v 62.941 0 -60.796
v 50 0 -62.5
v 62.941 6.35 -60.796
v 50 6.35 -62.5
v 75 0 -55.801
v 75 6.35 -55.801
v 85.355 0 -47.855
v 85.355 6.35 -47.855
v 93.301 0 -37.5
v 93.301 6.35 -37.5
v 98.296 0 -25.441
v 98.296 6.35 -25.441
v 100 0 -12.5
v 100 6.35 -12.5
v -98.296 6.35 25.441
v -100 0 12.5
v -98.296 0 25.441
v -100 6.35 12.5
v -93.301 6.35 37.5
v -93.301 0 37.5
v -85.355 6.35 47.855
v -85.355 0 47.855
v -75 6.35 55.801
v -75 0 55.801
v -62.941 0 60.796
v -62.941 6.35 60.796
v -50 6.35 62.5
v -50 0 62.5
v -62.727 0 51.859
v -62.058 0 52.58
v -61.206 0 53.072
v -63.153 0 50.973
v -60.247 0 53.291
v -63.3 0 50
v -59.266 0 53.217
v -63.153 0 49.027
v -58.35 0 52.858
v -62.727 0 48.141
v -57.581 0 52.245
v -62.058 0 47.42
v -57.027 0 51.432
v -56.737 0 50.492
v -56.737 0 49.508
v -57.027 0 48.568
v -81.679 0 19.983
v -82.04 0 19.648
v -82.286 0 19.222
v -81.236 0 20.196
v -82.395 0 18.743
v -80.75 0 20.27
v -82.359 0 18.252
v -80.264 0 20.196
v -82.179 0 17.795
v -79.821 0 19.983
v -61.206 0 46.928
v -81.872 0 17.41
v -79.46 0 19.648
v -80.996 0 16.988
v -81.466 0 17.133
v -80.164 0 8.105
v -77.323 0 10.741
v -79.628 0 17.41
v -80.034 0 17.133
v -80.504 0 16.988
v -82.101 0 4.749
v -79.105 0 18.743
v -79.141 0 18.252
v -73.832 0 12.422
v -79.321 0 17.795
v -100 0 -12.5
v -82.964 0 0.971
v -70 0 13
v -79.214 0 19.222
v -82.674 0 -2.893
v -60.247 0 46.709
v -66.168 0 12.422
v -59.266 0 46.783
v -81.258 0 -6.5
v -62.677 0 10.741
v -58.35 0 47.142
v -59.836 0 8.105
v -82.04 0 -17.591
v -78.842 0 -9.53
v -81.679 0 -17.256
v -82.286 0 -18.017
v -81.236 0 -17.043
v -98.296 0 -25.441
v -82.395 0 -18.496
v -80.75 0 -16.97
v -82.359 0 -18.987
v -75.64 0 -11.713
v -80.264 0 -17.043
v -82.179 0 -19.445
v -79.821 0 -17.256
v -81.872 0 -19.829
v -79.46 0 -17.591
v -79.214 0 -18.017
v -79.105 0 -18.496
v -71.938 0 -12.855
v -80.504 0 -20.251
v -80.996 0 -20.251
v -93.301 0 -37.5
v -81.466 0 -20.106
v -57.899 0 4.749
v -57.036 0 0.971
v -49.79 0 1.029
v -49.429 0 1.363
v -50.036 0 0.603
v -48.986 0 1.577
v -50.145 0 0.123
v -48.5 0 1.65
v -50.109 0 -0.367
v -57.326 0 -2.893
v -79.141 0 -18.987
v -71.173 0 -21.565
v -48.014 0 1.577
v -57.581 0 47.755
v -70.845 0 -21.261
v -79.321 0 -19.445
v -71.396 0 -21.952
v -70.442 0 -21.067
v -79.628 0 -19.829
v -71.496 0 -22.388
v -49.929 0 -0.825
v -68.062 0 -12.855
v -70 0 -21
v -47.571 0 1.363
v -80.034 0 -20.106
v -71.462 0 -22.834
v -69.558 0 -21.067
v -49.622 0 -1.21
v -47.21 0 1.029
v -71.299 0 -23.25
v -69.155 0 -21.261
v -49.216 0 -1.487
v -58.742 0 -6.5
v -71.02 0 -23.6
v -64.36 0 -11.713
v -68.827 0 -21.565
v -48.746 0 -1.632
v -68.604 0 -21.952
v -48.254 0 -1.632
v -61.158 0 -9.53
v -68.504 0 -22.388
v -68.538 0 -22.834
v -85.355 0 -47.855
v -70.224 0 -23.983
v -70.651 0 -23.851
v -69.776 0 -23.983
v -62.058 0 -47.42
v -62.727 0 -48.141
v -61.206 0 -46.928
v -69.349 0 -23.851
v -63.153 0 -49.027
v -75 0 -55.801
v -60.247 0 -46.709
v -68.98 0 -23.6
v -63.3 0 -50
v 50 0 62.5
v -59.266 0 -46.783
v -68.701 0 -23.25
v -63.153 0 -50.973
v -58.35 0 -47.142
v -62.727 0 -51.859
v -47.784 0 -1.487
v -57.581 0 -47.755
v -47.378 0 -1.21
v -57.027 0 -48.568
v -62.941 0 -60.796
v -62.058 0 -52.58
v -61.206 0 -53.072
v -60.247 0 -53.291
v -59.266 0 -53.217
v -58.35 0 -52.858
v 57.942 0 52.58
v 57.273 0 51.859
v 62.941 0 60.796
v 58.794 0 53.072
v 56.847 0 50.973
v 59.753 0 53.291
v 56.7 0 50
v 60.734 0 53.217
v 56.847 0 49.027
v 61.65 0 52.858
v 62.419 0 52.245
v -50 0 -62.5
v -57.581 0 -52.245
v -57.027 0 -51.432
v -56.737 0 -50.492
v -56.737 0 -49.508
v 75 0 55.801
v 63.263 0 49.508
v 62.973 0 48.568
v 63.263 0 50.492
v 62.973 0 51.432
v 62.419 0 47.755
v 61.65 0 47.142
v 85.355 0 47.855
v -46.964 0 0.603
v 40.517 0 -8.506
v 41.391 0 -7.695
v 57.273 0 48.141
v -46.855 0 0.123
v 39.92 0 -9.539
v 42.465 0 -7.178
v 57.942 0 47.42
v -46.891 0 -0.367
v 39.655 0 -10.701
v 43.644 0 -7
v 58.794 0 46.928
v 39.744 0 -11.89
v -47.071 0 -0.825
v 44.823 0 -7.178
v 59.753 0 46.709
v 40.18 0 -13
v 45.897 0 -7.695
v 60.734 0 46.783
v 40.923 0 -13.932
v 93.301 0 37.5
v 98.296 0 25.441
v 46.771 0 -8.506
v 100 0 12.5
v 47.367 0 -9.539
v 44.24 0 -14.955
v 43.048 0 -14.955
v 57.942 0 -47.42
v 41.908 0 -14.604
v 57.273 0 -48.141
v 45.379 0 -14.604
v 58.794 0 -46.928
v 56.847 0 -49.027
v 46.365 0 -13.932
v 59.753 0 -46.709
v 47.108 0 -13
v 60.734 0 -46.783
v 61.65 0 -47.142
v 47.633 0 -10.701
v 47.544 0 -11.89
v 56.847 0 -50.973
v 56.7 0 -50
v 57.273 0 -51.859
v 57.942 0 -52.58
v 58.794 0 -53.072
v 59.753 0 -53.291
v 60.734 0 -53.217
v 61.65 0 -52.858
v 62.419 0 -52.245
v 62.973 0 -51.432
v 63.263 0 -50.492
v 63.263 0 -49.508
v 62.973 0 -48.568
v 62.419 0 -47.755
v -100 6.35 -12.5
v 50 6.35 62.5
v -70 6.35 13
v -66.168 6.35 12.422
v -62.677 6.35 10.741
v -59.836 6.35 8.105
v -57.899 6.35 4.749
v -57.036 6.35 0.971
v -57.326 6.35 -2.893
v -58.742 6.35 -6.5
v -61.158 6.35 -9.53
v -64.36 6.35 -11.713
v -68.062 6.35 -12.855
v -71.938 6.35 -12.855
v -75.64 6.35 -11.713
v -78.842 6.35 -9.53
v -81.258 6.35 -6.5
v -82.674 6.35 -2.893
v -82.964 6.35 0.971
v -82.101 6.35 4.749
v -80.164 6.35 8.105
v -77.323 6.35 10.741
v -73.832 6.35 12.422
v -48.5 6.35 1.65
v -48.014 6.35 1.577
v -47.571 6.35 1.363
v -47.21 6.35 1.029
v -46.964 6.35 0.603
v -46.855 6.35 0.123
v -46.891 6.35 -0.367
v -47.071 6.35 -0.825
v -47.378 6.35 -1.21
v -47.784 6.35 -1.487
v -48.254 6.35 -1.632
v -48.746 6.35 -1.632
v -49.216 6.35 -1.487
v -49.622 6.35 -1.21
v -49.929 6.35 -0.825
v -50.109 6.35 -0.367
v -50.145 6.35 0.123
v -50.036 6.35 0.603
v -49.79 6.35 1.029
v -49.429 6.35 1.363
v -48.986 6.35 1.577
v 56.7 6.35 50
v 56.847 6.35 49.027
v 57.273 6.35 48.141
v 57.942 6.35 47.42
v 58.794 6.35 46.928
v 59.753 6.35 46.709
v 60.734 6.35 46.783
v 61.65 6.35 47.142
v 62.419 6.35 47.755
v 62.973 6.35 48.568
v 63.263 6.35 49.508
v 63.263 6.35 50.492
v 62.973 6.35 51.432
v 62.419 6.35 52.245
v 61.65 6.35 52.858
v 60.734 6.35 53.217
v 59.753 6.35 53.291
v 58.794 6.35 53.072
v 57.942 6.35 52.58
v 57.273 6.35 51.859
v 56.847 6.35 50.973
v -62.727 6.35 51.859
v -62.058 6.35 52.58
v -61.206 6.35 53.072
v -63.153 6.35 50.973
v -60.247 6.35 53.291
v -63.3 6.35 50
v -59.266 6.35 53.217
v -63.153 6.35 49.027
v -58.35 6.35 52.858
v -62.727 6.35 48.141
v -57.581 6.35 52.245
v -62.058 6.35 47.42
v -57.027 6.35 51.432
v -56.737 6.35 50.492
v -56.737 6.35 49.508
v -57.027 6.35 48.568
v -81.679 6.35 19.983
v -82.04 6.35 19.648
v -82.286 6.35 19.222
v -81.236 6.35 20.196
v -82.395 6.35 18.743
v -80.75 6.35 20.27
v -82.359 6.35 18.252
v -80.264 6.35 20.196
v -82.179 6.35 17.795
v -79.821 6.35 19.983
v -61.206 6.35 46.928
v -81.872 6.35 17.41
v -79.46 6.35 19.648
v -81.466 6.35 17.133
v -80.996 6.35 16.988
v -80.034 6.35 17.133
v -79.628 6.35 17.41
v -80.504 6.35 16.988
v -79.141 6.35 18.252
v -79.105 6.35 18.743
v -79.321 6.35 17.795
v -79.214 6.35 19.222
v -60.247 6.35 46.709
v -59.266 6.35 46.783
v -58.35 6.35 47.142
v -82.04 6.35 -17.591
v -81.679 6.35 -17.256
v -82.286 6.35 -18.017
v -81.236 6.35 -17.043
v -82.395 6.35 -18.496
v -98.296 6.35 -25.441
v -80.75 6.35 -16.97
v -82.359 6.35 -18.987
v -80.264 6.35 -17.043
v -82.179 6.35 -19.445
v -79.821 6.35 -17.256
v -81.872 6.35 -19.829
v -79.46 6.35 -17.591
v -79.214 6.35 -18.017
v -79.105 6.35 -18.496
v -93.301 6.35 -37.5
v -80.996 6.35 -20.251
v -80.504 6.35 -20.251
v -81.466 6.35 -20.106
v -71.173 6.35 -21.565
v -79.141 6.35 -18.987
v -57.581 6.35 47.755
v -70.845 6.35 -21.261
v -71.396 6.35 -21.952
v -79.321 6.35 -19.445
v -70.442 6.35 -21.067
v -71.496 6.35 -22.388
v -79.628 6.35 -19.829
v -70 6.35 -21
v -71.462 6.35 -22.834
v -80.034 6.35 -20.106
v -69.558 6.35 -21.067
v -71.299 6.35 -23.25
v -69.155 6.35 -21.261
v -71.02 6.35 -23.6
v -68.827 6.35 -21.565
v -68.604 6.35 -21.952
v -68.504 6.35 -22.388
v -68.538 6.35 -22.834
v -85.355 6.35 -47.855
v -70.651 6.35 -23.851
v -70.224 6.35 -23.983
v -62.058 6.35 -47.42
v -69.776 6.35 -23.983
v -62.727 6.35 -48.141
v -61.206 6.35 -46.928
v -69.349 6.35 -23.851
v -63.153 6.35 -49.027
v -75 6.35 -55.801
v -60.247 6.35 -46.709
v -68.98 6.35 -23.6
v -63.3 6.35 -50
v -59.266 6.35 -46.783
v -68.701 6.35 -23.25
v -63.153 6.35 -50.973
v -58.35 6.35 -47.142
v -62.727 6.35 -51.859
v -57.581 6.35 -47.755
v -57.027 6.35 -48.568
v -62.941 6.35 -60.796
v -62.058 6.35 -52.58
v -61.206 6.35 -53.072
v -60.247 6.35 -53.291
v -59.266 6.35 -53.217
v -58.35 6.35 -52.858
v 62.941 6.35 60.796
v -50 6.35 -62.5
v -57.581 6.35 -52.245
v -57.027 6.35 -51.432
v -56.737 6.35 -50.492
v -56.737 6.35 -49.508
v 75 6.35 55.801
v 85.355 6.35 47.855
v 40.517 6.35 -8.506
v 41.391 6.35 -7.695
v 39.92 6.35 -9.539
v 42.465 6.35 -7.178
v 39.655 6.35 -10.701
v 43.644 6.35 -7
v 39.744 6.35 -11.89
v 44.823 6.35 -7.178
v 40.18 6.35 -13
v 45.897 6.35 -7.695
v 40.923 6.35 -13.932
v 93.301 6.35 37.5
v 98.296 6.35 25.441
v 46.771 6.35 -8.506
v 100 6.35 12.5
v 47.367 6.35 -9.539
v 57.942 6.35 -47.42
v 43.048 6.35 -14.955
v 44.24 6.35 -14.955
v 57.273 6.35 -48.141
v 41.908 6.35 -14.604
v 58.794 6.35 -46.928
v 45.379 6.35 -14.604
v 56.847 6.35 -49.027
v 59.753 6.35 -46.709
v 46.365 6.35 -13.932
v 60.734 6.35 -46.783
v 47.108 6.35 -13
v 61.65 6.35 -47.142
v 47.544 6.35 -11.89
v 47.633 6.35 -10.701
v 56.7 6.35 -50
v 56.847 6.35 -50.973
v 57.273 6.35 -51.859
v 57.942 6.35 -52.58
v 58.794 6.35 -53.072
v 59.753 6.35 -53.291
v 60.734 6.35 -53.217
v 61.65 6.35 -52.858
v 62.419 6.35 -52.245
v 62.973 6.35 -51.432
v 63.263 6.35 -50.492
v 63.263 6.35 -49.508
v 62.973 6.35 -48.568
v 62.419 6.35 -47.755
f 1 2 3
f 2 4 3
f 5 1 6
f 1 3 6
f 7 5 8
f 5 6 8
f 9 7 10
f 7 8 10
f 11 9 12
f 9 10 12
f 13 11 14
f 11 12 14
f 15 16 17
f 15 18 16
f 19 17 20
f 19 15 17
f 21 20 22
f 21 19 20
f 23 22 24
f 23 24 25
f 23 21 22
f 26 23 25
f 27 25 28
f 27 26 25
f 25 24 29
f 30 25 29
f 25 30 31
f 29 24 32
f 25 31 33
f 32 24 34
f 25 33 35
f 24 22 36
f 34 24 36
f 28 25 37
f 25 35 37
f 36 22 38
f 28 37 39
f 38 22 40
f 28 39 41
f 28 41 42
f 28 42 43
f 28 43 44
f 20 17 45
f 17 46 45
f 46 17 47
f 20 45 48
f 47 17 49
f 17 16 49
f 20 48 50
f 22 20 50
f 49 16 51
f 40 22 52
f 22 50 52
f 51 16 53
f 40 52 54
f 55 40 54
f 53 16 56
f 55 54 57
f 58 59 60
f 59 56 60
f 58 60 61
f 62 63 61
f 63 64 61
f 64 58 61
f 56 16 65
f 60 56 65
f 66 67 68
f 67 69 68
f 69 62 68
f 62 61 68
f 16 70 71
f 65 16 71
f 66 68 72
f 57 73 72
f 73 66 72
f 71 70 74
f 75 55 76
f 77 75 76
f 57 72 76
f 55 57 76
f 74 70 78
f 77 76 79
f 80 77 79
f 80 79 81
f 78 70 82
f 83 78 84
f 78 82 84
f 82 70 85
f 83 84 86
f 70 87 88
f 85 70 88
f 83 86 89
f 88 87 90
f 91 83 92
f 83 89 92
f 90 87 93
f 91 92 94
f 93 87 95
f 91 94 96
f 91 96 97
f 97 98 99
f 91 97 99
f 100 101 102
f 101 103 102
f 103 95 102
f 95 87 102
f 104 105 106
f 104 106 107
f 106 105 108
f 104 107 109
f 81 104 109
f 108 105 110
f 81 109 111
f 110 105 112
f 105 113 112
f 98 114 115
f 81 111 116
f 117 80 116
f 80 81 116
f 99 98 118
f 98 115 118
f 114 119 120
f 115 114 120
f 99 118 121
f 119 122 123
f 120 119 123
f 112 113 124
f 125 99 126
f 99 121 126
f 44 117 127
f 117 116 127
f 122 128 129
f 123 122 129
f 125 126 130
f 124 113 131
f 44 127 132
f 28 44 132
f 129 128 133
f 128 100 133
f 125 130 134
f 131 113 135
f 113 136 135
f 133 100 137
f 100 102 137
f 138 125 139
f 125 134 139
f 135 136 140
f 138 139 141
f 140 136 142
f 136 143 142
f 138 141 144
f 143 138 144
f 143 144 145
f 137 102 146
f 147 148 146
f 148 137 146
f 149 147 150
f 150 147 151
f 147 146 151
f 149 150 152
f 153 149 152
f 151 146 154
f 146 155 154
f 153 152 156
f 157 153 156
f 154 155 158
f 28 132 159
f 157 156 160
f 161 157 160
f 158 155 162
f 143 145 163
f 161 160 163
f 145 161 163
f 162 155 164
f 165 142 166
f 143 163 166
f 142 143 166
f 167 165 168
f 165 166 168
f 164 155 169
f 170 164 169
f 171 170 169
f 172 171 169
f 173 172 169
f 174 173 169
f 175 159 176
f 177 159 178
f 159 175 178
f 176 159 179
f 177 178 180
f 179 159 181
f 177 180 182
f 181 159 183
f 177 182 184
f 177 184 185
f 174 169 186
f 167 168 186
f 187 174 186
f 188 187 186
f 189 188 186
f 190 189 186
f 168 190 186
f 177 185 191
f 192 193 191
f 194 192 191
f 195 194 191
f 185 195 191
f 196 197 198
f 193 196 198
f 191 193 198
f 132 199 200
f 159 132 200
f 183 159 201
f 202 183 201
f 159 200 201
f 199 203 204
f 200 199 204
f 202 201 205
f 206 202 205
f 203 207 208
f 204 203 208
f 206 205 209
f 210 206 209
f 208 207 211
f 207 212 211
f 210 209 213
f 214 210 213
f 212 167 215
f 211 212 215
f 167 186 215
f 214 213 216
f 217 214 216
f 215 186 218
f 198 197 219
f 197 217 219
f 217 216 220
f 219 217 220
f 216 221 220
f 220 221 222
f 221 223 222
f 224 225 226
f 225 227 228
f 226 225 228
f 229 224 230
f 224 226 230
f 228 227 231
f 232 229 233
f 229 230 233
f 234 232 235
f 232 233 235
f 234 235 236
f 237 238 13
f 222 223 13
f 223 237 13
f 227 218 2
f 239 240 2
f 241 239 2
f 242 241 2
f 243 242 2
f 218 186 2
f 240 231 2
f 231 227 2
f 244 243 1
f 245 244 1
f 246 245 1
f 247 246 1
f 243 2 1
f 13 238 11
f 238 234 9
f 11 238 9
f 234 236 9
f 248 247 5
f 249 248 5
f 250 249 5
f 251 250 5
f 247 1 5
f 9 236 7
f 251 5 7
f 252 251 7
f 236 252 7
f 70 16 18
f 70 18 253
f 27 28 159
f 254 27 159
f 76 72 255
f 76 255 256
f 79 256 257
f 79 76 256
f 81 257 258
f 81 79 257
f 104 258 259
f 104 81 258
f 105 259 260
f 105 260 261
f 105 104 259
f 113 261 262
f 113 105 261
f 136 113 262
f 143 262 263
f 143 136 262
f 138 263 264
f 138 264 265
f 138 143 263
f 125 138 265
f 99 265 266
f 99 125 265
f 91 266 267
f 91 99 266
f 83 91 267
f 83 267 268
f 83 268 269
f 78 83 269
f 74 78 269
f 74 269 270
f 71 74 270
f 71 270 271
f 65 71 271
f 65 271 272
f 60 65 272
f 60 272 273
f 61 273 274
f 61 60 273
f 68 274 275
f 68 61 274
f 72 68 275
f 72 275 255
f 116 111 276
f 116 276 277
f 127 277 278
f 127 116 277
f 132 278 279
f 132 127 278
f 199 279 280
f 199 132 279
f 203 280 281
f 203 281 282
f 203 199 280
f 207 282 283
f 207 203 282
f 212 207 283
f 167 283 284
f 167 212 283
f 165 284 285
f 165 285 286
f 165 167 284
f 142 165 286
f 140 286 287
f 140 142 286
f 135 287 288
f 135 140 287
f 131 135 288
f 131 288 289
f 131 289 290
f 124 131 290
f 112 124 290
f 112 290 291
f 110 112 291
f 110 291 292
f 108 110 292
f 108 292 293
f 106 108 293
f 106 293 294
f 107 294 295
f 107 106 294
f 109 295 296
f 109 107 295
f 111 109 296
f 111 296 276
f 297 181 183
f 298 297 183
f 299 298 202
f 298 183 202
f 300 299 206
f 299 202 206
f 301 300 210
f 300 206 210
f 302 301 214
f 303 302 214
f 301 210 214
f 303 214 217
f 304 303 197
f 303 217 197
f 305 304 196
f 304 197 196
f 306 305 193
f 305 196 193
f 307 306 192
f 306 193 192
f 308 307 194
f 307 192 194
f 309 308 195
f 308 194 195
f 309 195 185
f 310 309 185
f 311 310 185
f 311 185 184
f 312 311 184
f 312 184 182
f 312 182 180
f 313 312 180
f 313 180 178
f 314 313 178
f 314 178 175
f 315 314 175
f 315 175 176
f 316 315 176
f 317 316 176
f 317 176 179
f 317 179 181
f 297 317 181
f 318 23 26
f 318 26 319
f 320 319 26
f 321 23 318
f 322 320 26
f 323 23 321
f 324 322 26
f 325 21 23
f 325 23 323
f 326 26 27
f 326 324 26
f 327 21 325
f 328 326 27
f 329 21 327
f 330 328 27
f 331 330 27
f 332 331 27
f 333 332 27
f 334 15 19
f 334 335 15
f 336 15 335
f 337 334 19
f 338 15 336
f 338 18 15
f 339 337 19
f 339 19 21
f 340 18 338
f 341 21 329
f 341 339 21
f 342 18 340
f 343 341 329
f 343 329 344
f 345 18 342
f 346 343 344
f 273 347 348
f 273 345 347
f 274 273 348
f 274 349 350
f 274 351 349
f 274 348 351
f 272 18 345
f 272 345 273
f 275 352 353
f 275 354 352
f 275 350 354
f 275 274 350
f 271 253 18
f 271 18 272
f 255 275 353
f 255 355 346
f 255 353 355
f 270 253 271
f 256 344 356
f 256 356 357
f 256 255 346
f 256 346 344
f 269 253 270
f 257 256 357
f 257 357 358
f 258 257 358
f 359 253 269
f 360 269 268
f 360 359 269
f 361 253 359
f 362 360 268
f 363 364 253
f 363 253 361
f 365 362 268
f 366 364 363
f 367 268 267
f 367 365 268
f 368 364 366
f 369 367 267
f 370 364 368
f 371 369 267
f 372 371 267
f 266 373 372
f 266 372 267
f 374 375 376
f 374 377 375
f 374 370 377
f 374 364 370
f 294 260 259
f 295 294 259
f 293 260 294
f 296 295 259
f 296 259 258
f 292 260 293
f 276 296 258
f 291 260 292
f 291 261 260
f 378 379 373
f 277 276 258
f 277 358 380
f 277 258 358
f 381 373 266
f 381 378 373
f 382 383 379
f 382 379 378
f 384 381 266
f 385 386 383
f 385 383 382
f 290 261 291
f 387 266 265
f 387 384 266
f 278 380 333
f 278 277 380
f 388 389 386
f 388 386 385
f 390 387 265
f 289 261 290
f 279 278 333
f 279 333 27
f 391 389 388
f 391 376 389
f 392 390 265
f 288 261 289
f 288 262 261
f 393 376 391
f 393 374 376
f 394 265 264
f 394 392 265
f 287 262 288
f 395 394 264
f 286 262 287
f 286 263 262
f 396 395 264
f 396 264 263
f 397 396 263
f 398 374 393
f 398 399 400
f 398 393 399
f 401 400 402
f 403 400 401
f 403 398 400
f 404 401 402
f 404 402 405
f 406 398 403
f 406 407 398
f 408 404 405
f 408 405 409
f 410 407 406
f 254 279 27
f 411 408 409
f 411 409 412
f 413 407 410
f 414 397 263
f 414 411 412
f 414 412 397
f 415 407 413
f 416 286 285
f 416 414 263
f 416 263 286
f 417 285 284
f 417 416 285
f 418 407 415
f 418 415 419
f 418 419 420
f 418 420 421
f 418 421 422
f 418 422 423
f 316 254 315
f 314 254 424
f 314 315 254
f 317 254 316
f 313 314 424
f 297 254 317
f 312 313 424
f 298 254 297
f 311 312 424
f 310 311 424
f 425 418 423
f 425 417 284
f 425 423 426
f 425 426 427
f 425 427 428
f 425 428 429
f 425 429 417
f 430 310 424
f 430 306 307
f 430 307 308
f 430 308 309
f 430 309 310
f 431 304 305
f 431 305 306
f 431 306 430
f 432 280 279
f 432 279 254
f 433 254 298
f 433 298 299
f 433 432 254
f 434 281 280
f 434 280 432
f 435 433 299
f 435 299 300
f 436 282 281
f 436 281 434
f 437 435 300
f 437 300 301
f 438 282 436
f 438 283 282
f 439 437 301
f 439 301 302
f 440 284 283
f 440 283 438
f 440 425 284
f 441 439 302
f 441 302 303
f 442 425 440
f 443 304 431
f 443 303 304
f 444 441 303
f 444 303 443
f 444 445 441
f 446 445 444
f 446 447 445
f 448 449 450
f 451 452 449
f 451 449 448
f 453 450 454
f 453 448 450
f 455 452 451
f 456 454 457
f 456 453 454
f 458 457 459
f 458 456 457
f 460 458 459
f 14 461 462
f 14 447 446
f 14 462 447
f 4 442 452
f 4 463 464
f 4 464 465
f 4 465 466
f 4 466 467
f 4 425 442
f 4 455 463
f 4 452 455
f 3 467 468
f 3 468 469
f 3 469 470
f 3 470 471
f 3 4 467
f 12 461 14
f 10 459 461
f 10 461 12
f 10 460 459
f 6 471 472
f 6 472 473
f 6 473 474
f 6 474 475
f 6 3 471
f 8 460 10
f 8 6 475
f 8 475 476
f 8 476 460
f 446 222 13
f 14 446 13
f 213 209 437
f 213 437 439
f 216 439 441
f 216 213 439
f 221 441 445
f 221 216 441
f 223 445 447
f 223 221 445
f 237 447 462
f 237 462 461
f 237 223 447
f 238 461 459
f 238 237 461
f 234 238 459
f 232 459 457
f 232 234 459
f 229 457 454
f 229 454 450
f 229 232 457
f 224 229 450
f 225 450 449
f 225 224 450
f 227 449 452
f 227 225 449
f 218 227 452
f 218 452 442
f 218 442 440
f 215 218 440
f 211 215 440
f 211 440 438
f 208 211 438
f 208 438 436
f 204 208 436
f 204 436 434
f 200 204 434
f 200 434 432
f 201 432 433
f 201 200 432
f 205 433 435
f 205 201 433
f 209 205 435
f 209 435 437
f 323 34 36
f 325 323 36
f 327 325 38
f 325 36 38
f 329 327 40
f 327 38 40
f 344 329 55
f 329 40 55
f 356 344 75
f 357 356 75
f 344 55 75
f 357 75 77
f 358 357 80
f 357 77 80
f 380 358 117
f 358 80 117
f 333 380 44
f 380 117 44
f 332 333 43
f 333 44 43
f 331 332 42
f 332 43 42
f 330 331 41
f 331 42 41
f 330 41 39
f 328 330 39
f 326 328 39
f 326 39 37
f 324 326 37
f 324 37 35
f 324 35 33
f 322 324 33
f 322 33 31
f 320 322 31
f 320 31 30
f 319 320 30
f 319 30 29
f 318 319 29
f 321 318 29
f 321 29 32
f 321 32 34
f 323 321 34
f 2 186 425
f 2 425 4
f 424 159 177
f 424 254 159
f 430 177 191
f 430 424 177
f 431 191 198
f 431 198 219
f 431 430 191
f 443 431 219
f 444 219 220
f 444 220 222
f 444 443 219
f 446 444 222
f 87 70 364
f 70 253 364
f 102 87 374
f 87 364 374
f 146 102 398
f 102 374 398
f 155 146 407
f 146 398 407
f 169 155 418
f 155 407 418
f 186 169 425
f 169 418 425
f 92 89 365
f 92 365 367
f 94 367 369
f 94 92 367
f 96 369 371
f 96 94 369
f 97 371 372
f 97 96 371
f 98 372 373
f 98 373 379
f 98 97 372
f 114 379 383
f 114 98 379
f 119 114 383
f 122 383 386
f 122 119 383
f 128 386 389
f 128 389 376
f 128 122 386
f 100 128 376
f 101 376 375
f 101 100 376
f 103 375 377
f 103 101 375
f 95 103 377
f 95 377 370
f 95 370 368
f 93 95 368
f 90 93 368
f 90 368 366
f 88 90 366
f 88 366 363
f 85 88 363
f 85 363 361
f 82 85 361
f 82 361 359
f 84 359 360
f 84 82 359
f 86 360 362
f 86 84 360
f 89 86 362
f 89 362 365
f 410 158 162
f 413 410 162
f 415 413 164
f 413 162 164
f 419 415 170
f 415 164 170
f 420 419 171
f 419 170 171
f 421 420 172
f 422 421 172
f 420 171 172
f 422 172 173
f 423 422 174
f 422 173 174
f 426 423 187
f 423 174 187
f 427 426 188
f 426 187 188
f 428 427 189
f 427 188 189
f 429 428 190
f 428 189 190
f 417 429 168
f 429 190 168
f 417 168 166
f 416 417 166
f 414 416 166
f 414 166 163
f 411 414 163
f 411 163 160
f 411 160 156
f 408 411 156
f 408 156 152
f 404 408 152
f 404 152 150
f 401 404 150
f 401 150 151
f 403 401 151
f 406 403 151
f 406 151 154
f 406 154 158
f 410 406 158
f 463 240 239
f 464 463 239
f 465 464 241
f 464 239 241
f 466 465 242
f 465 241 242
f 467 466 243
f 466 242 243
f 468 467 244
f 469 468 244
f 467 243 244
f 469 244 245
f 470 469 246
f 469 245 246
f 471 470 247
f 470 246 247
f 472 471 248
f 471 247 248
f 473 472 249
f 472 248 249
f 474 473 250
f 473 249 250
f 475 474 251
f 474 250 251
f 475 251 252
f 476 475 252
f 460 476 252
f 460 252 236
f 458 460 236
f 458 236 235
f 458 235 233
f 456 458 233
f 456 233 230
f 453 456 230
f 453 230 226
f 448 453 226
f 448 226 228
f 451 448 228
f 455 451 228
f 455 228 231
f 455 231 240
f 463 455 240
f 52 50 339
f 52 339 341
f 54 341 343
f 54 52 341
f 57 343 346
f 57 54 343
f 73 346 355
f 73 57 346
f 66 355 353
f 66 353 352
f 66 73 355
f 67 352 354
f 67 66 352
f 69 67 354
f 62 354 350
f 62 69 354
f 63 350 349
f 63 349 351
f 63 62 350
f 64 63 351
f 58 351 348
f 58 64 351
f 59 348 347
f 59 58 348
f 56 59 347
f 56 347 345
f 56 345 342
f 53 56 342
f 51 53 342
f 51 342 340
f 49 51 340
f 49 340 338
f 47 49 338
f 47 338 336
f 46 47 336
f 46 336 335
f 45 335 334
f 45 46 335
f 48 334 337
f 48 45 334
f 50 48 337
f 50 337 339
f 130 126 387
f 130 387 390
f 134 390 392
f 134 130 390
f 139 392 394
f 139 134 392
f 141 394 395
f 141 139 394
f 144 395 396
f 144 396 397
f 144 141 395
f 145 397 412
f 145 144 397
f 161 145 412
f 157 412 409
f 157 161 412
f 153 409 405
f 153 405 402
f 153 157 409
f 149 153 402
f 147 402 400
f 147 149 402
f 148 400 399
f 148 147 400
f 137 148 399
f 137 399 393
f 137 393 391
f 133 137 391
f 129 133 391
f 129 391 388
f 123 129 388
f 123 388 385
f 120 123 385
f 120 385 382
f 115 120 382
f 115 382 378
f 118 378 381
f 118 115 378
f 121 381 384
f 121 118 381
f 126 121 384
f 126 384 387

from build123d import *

# Parameters (mm, degrees)
SKETCH2_W                = 200
SKETCH2_H                = 125
SKETCH2_R                = 1.65
SKETCH2_R_2              = 13
SKETCH2_R_3              = 1.5
SKETCH2_R_4              = 4
BOSS_EXTRUDE1_DEPTH      = 6.35
FILLET1_R                = 50
M6_CLEARANCE_HOLE1_D     = 6.6
M6_CLEARANCE_HOLE1_DEPTH = 15
M6_CLEARANCE_HOLE1_TIP   = 1.982840043


with BuildPart() as part:
    # Sketch2 → Boss-Extrude1 (new body)
    with BuildSketch(Plane(origin=(0, 0, 0), x_dir=(1, 0, 0), z_dir=(0, 1, 0))):
        Rectangle(SKETCH2_W, SKETCH2_H)
        with Locations(Location((-48.5, 0, 0), (0, 0, 270))):
            Circle(SKETCH2_R, mode=Mode.SUBTRACT)
        with Locations(Location((-80.75, -18.619546181, 0), (0, 0, 270))):
            Circle(SKETCH2_R, mode=Mode.SUBTRACT)
        with Locations(Location((-70, 0, 0), (0, 0, 270))):
            Circle(SKETCH2_R_2, mode=Mode.SUBTRACT)
        with Locations(Location((-80.75, 18.619546181, 0), (0, 0, 270))):
            Circle(SKETCH2_R, mode=Mode.SUBTRACT)
        with Locations(Location((-70, 22.5, 0), (0, 0, 270))):
            Circle(SKETCH2_R_3, mode=Mode.SUBTRACT)
        with Locations(Location((43.64387632, 11, 0), (0, 0, 270))):
            Circle(SKETCH2_R_4, mode=Mode.SUBTRACT)
    extrude(amount=BOSS_EXTRUDE1_DEPTH)

    # Fillet1
    fillet1_edges = [part.edges().sort_by_distance(p)[0] for p in [
        (-100, 3.175, 62.5),
        (-100, 3.175, -62.5),
        (100, 3.175, -62.5),
        (100, 3.175, 62.5),
    ]]
    fillet(fillet1_edges, radius=FILLET1_R)

    # M6 Clearance Hole1
    with Locations(Plane(origin=(0, 6.35, 0), x_dir=(1, 0, 0), z_dir=(0, 1, 0))):
        with Locations((60, 50), (-60, -50), (-60, 50), (60, -50)):
            Hole(M6_CLEARANCE_HOLE1_D / 2, depth=M6_CLEARANCE_HOLE1_DEPTH)
            with Locations((0, 0, -(M6_CLEARANCE_HOLE1_DEPTH + M6_CLEARANCE_HOLE1_TIP / 2))):  # 118° drill point
                Cone(0, M6_CLEARANCE_HOLE1_D / 2, M6_CLEARANCE_HOLE1_TIP, mode=Mode.SUBTRACT)


solid = part.part
